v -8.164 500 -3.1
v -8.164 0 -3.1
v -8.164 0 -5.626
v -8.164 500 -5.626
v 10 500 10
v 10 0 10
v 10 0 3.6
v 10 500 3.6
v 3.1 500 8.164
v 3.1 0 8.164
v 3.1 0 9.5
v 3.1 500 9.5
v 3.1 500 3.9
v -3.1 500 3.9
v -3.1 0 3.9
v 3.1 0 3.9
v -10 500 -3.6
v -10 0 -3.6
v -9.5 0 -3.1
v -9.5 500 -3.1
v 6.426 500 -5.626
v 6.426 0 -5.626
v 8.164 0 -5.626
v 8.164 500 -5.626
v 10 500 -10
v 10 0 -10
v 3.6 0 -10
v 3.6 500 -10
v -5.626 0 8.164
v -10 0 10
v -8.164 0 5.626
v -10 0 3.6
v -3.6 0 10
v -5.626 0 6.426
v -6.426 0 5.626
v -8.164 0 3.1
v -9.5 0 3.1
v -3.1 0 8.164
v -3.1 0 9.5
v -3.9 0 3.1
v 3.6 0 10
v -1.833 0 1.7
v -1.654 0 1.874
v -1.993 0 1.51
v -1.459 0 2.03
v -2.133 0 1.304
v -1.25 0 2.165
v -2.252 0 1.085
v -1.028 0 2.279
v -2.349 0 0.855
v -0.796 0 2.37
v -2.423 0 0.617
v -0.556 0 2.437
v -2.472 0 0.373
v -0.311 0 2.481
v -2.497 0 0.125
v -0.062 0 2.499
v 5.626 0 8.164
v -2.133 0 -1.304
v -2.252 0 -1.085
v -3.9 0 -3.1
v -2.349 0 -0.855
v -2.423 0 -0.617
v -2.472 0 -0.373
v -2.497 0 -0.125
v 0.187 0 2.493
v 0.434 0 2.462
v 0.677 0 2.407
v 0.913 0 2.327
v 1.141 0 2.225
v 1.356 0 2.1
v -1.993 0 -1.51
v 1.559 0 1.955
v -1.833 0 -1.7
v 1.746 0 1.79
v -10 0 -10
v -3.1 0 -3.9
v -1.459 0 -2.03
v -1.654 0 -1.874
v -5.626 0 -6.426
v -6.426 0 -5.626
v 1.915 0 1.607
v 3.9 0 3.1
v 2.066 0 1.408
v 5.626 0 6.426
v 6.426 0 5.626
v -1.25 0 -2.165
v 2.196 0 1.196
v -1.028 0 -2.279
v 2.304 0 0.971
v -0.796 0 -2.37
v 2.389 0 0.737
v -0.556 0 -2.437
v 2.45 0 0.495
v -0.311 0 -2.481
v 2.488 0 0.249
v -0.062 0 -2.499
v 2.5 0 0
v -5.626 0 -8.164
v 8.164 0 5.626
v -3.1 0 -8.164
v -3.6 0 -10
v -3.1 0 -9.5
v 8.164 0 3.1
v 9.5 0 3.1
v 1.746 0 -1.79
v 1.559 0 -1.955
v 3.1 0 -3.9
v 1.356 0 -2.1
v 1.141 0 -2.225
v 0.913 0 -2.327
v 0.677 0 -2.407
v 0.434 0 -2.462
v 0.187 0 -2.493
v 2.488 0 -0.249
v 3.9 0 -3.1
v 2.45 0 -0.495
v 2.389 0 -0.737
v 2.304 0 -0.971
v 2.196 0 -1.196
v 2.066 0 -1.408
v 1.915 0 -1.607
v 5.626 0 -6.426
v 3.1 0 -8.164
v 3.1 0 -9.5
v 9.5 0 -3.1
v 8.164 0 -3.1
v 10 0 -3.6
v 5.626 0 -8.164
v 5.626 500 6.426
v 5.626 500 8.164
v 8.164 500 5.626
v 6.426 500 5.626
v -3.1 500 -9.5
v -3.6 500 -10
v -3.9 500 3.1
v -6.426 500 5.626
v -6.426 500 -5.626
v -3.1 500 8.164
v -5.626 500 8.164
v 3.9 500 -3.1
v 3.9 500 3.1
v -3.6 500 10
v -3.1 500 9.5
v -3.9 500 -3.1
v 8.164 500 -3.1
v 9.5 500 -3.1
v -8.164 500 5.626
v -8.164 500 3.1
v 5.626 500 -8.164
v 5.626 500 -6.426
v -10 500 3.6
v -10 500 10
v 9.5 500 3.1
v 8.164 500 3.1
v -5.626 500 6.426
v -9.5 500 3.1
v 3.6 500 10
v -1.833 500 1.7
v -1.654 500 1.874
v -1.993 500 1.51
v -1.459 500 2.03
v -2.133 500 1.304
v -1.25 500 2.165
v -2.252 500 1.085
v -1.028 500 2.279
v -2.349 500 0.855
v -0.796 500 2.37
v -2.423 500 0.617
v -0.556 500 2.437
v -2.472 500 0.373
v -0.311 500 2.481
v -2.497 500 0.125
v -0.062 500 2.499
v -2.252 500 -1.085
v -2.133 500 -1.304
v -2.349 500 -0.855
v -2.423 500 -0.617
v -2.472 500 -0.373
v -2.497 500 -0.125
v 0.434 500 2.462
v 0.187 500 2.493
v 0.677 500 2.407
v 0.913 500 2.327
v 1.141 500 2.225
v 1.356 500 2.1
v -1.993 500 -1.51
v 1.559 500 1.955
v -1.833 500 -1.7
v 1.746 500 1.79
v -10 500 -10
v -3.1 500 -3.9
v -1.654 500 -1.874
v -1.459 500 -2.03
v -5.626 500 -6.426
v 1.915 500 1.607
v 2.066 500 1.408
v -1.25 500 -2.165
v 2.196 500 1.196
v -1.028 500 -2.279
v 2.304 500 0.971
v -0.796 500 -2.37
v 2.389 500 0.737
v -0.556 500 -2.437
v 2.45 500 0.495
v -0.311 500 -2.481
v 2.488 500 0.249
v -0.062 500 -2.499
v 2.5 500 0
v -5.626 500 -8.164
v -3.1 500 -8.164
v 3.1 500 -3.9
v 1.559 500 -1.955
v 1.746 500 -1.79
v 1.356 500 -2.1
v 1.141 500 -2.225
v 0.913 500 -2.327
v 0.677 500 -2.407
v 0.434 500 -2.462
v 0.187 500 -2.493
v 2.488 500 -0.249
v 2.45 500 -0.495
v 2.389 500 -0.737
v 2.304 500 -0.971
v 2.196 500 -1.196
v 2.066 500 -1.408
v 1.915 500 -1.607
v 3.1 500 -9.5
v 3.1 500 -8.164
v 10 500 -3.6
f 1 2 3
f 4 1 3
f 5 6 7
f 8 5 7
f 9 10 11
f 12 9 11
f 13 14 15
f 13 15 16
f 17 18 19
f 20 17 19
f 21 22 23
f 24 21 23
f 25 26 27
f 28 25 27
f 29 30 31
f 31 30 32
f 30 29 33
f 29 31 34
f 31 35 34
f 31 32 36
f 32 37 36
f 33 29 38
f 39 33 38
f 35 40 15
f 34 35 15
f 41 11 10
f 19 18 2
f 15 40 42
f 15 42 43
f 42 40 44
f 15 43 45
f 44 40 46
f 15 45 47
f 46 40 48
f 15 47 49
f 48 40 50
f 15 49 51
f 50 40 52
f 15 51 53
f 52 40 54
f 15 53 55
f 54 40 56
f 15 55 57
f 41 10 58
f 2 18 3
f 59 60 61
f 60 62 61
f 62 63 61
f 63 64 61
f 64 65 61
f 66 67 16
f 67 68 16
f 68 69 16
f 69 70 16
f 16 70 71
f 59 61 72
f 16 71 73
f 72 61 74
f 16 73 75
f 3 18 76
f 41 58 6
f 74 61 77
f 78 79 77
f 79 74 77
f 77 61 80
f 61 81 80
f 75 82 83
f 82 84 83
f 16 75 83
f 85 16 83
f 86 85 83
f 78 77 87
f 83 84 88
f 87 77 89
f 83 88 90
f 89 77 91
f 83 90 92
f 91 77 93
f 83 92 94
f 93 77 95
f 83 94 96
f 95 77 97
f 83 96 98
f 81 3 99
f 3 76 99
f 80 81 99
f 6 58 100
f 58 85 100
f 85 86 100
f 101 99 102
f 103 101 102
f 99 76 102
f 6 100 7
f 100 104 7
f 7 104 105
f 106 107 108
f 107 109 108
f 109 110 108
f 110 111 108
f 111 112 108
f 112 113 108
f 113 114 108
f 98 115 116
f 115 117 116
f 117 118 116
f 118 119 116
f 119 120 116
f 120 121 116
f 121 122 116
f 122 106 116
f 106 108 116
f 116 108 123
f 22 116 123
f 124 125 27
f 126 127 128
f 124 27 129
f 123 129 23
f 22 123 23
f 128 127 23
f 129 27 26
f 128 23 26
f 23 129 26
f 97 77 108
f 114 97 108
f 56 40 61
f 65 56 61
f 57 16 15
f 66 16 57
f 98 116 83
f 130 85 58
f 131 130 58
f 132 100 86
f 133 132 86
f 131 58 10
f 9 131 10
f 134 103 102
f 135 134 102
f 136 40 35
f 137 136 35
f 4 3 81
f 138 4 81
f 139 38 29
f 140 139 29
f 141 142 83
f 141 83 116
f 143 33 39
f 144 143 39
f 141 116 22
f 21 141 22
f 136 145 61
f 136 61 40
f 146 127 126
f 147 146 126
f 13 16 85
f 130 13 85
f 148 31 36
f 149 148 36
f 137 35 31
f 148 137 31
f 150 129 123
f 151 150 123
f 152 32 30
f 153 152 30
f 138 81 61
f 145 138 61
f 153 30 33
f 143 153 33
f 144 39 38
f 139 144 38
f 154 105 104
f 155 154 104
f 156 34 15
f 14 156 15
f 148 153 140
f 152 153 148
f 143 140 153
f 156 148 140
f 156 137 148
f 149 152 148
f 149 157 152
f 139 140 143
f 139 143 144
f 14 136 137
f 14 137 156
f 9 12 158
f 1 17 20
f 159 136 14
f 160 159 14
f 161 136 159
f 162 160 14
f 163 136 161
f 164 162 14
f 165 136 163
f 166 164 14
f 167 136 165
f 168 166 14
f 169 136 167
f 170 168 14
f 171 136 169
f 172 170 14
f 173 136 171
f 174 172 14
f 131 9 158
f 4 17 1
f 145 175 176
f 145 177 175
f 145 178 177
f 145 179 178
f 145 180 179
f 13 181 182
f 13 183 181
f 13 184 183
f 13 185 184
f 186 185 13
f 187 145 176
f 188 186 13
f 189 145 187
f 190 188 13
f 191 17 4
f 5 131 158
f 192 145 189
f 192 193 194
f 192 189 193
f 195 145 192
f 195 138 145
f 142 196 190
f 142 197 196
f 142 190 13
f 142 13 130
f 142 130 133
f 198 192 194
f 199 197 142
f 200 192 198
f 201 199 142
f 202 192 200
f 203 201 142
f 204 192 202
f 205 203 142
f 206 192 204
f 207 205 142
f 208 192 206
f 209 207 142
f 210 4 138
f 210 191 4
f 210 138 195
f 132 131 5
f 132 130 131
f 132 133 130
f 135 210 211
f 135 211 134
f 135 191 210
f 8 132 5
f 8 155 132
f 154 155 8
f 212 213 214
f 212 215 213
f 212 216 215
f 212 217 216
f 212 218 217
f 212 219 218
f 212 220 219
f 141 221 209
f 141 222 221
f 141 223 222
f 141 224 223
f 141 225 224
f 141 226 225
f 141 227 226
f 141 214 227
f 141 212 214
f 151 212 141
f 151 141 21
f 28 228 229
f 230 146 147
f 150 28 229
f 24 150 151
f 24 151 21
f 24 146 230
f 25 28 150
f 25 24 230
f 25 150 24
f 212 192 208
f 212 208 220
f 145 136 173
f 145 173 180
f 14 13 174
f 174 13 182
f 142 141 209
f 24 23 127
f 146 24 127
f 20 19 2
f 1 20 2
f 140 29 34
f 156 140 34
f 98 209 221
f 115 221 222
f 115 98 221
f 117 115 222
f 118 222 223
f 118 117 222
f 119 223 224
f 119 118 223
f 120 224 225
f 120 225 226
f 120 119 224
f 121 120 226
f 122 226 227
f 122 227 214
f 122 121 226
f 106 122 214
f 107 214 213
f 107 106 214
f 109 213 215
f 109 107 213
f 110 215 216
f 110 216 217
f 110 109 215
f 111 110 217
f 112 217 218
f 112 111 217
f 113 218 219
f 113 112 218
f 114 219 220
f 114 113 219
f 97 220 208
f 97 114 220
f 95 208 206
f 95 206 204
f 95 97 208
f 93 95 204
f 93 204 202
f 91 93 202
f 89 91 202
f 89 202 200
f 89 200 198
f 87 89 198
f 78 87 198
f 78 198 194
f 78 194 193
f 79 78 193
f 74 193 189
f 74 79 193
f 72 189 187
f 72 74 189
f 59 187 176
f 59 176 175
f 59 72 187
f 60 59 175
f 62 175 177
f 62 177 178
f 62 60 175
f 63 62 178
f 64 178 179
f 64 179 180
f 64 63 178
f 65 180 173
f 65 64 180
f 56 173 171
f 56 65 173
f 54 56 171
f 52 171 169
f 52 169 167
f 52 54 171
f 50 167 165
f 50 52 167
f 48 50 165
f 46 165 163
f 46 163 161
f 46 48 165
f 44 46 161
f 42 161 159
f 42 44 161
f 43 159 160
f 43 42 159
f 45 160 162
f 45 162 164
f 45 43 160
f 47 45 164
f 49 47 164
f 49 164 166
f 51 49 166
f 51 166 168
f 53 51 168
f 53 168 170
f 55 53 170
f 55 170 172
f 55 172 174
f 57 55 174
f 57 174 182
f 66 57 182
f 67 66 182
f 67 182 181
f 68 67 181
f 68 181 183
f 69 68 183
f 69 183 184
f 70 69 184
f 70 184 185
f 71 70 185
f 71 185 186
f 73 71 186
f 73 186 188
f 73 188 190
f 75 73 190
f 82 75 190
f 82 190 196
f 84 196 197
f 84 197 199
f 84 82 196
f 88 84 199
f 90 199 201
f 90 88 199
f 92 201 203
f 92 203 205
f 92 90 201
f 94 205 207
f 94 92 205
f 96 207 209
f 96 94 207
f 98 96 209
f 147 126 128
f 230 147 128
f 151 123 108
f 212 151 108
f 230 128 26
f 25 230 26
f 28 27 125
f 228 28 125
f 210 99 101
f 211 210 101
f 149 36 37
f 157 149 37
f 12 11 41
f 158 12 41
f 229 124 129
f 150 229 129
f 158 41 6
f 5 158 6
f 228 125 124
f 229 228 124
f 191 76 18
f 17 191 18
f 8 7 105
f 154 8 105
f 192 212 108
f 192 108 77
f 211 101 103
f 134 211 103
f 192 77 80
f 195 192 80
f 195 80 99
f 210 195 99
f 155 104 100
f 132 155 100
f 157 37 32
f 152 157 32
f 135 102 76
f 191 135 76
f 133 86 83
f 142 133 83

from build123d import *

# Parameters (mm, degrees)
SKETCH1_R           = 2.5
BOSS_EXTRUDE1_DEPTH = 500


with BuildPart() as part:
    # Sketch1 → Boss-Extrude1 (new body)
    with BuildSketch(Plane(origin=(0, 0, 0), x_dir=(1, 0, 0), z_dir=(0, 1, 0))):
        Polygon((3.9, 0), (3.9, 3.1), (6.425901812, 5.625901812), (8.163583062, 5.625901812), (8.163583062, 3.1), (9.5, 3.1), (10, 3.6), (10, 10), (3.6, 10), (3.1, 9.5), (3.1, 8.163583062), (5.625901812, 8.163583062), (5.625901812, 6.425901812), (3.1, 3.9), (0, 3.9), (-3.1, 3.9), (-5.625901812, 6.425901812), (-5.625901812, 8.163583062), (-3.1, 8.163583062), (-3.1, 9.5), (-3.6, 10), (-10, 10), (-10, 3.6), (-9.5, 3.1), (-8.163583062, 3.1), (-8.163583062, 5.625901812), (-6.425901812, 5.625901812), (-3.9, 3.1), (-3.9, 0), (-3.9, -3.1), (-6.425901812, -5.625901812), (-8.163583062, -5.625901812), (-8.163583062, -3.1), (-9.5, -3.1), (-10, -3.6), (-10, -10), (-3.6, -10), (-3.1, -9.5), (-3.1, -8.163583062), (-5.625901812, -8.163583062), (-5.625901812, -6.425901812), (-3.1, -3.9), (0, -3.9), (3.1, -3.9), (5.625901812, -6.425901812), (5.625901812, -8.163583062), (3.1, -8.163583062), (3.1, -9.5), (3.6, -10), (10, -10), (10, -3.6), (9.5, -3.1), (8.163583062, -3.1), (8.163583062, -5.625901812), (6.425901812, -5.625901812), (3.9, -3.1), align=None)
        Circle(SKETCH1_R, mode=Mode.SUBTRACT)
    extrude(amount=BOSS_EXTRUDE1_DEPTH)


solid = part.part
